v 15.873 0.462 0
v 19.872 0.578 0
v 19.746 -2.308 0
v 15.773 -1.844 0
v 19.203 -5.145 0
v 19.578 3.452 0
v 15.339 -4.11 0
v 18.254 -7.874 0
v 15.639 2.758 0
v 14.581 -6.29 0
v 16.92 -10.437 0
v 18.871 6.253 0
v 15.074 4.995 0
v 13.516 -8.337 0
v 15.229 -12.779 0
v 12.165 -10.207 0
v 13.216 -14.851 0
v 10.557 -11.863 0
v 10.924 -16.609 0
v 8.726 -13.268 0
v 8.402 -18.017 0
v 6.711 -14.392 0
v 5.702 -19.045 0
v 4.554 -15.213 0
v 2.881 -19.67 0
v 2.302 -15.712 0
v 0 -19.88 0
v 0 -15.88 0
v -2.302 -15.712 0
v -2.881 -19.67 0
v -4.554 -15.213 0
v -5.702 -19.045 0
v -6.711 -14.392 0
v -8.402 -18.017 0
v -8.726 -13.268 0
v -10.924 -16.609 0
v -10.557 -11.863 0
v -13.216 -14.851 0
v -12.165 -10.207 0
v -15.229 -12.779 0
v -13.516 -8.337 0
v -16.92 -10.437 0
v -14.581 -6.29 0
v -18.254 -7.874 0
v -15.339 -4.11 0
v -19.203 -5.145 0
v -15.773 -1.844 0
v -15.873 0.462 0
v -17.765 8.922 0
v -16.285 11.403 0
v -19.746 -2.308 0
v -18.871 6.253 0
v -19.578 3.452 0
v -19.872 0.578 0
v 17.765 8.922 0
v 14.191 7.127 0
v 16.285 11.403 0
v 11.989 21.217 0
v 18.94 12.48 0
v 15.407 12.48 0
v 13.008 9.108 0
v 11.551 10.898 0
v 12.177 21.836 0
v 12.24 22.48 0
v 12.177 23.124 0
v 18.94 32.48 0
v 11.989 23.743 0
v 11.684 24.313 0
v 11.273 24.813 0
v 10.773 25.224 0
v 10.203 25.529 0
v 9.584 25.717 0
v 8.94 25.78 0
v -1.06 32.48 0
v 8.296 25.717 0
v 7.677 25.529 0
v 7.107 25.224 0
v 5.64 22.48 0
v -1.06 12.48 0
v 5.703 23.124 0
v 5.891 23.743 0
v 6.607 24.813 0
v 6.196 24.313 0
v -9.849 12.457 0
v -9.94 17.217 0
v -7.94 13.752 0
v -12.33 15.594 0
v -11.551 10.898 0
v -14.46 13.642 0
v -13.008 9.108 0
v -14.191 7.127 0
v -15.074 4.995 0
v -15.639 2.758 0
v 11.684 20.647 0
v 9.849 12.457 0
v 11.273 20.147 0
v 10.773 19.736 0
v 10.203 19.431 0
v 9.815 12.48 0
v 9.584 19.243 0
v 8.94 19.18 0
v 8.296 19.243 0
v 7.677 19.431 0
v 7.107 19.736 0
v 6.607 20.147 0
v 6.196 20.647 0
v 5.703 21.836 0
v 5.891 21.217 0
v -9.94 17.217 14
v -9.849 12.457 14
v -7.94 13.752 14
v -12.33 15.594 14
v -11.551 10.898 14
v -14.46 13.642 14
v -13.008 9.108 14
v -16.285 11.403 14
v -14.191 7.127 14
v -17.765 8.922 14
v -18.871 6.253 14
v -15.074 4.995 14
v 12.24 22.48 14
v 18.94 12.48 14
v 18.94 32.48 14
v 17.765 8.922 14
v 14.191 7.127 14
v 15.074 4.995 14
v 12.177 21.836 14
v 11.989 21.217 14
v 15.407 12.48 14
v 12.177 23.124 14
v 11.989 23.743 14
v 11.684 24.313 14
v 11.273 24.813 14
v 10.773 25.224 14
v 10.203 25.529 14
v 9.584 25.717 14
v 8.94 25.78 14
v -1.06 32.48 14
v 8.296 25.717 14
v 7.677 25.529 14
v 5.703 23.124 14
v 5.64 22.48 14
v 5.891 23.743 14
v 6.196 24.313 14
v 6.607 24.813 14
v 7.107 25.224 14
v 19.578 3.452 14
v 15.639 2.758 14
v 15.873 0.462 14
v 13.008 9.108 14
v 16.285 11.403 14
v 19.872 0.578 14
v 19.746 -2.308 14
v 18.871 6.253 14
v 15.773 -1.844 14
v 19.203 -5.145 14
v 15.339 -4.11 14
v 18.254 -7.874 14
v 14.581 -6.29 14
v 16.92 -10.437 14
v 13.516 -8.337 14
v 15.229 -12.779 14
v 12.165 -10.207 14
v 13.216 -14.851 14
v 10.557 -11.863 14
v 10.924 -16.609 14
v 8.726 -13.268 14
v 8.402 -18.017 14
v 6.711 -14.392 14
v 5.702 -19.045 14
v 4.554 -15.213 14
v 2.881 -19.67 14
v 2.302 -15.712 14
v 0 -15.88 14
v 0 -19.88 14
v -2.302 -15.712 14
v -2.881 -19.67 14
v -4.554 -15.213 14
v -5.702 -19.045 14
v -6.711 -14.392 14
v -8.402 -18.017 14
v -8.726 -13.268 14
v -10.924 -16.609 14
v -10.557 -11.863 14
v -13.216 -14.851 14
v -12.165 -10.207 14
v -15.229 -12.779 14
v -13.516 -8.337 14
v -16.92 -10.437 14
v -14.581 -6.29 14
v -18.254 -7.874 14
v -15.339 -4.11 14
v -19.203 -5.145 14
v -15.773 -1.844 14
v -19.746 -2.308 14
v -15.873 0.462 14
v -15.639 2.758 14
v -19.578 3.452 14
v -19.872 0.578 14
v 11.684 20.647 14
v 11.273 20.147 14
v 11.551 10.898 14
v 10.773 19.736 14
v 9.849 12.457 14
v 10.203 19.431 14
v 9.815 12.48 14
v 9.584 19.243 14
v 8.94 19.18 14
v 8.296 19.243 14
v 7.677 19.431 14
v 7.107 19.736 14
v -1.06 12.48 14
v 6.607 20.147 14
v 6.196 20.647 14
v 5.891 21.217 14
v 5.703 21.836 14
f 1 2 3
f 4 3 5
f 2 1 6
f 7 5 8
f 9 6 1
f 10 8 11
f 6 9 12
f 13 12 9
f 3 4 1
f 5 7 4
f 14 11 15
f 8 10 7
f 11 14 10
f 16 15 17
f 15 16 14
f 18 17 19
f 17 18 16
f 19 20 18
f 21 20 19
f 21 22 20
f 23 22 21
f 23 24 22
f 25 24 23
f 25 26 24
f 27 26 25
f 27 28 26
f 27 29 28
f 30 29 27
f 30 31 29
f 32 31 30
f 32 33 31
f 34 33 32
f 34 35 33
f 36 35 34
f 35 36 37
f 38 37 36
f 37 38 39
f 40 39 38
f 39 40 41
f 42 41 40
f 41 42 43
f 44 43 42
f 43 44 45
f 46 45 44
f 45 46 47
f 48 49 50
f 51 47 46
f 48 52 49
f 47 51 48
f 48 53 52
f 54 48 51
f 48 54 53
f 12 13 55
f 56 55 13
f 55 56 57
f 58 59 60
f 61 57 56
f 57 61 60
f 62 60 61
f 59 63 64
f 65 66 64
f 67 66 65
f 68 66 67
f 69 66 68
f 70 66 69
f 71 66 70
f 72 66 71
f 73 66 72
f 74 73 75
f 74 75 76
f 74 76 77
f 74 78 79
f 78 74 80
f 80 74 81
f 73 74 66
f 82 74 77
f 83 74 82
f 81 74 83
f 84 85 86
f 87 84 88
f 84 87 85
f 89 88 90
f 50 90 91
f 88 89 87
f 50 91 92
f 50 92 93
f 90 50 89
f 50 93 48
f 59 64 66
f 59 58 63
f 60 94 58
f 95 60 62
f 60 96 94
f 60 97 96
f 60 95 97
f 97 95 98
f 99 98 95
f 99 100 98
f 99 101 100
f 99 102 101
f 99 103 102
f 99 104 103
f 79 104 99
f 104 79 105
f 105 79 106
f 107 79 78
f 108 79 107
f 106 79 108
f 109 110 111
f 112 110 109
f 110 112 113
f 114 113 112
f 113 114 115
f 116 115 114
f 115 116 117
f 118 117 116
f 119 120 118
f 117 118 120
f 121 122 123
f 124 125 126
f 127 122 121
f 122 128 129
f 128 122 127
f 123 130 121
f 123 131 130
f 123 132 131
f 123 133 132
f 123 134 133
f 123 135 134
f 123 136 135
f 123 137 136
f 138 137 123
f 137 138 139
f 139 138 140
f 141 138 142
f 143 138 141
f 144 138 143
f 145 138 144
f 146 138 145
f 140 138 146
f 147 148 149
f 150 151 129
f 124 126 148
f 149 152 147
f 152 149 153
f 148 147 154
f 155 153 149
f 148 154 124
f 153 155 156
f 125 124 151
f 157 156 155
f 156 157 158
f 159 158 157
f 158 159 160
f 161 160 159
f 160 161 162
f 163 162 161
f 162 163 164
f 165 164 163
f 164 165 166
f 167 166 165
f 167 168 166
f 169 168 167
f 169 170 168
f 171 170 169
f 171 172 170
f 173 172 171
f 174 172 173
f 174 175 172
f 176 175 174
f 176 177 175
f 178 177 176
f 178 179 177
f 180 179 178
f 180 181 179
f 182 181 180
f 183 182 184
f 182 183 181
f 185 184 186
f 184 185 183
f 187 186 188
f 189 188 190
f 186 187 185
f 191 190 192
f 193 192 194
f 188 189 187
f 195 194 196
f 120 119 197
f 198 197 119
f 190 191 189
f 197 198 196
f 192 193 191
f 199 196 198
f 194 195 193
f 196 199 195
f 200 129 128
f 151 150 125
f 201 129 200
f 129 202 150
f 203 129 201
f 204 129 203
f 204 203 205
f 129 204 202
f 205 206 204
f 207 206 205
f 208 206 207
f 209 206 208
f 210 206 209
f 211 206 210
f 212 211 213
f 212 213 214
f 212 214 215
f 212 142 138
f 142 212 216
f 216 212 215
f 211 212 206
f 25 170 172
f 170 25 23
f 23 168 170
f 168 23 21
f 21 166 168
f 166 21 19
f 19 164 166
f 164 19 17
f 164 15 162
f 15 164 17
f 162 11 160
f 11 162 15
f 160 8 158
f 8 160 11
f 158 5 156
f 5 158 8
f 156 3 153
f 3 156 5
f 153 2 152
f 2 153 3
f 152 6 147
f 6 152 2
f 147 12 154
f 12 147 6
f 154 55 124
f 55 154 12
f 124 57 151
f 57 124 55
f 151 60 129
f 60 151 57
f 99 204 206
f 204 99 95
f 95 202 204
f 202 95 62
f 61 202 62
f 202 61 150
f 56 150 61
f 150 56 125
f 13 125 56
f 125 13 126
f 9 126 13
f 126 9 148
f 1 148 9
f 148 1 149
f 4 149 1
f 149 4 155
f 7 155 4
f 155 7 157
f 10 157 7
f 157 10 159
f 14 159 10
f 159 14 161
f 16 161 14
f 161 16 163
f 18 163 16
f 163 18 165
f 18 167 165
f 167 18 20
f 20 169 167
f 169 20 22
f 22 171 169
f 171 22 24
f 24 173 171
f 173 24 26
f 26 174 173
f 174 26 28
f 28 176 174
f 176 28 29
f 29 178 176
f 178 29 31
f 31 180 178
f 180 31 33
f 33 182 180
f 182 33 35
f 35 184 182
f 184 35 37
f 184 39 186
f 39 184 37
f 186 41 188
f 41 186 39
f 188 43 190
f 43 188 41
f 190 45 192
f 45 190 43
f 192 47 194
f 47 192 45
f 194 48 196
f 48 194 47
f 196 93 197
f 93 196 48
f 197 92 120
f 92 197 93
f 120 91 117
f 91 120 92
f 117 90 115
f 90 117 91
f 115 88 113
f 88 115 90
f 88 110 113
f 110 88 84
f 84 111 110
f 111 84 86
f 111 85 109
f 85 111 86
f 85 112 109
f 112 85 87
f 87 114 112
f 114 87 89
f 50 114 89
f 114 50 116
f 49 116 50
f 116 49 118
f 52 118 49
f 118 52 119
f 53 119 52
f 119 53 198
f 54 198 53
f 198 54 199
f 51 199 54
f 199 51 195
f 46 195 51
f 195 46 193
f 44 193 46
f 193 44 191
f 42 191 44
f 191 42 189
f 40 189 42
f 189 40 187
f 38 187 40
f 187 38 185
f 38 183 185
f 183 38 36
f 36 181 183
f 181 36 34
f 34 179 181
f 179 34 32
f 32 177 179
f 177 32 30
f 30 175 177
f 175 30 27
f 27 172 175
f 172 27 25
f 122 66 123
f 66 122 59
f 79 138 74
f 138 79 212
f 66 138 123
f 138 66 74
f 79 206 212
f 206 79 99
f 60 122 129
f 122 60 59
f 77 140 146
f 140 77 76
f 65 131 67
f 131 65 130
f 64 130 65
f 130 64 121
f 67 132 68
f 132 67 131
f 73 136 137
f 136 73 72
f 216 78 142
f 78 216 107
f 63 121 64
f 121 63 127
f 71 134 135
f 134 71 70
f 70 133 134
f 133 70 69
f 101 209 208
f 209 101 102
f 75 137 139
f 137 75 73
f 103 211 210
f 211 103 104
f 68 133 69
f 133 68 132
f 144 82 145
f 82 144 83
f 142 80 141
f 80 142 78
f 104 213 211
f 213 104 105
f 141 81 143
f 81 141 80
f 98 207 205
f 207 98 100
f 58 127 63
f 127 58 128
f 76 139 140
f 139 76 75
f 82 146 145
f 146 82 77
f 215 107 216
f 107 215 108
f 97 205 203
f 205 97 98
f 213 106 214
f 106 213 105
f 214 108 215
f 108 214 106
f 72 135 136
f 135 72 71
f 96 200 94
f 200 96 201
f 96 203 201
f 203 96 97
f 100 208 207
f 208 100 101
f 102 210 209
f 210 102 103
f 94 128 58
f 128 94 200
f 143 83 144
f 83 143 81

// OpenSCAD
$fn = 32;

// ----------------------------------------------------------------------
// Pipe clamp: 39.76 mm ring, 4 mm wall, 14 mm wide
// ----------------------------------------------------------------------

// --- parameters (mm) ---
outer_r = 19.88;          // clamp outside radius
inner_r = 15.88;          // pipe bore radius
band = 4;                 // band thickness
clamp_w = 14;             // clamp width
opening = 60;             // opening angle between the ends
lug_w = 20;               // lug width
lug_len = 20;             // lug length
bolt_d = 6.6;             // bolt hole

clamp_profile = [[-9.94, 17.217], [-12.33, 15.594], [-14.46, 13.642], [-16.285, 11.403], [-17.765, 8.922], [-18.871, 6.253], [-19.578, 3.452], [-19.872, 0.578], [-19.746, -2.308], [-19.203, -5.145], [-18.254, -7.874], [-16.92, -10.437], [-15.229, -12.779], [-13.216, -14.851], [-10.924, -16.609], [-8.402, -18.017], [-5.702, -19.045], [-2.881, -19.67], [0, -19.88], [2.881, -19.67], [5.702, -19.045], [8.402, -18.017], [10.924, -16.609], [13.216, -14.851], [15.229, -12.779], [16.92, -10.437], [18.254, -7.874], [19.203, -5.145], [19.746, -2.308], [19.872, 0.578], [19.578, 3.452], [18.871, 6.253], [17.765, 8.922], [16.285, 11.403], [14.46, 13.642], [12.33, 15.594], [9.94, 17.217], [7.94, 13.752], [9.849, 12.457], [11.551, 10.898], [13.008, 9.108], [14.191, 7.127], [15.074, 4.995], [15.639, 2.758], [15.873, 0.462], [15.773, -1.844], [15.339, -4.11], [14.581, -6.29], [13.516, -8.337], [12.165, -10.207], [10.557, -11.863], [8.726, -13.268], [6.711, -14.392], [4.554, -15.213], [2.302, -15.712], [0, -15.88], [-2.302, -15.712], [-4.554, -15.213], [-6.711, -14.392], [-8.726, -13.268], [-10.557, -11.863], [-12.165, -10.207], [-13.516, -8.337], [-14.581, -6.29], [-15.339, -4.11], [-15.773, -1.844], [-15.873, 0.462], [-15.639, 2.758], [-15.074, 4.995], [-14.191, 7.127], [-13.008, 9.108], [-11.551, 10.898], [-9.849, 12.457], [-7.94, 13.752]];

difference() {
  union() {
    linear_extrude(height = clamp_w) polygon(clamp_profile);
    /* bolt lug on the other end */
    translate([-1.06, 12.48, 0]) cube([lug_w, 20, clamp_w]);
  }
  translate([8.94, 22.48, -2.5]) cylinder(h = clamp_w + 5, d = bolt_d);
}
